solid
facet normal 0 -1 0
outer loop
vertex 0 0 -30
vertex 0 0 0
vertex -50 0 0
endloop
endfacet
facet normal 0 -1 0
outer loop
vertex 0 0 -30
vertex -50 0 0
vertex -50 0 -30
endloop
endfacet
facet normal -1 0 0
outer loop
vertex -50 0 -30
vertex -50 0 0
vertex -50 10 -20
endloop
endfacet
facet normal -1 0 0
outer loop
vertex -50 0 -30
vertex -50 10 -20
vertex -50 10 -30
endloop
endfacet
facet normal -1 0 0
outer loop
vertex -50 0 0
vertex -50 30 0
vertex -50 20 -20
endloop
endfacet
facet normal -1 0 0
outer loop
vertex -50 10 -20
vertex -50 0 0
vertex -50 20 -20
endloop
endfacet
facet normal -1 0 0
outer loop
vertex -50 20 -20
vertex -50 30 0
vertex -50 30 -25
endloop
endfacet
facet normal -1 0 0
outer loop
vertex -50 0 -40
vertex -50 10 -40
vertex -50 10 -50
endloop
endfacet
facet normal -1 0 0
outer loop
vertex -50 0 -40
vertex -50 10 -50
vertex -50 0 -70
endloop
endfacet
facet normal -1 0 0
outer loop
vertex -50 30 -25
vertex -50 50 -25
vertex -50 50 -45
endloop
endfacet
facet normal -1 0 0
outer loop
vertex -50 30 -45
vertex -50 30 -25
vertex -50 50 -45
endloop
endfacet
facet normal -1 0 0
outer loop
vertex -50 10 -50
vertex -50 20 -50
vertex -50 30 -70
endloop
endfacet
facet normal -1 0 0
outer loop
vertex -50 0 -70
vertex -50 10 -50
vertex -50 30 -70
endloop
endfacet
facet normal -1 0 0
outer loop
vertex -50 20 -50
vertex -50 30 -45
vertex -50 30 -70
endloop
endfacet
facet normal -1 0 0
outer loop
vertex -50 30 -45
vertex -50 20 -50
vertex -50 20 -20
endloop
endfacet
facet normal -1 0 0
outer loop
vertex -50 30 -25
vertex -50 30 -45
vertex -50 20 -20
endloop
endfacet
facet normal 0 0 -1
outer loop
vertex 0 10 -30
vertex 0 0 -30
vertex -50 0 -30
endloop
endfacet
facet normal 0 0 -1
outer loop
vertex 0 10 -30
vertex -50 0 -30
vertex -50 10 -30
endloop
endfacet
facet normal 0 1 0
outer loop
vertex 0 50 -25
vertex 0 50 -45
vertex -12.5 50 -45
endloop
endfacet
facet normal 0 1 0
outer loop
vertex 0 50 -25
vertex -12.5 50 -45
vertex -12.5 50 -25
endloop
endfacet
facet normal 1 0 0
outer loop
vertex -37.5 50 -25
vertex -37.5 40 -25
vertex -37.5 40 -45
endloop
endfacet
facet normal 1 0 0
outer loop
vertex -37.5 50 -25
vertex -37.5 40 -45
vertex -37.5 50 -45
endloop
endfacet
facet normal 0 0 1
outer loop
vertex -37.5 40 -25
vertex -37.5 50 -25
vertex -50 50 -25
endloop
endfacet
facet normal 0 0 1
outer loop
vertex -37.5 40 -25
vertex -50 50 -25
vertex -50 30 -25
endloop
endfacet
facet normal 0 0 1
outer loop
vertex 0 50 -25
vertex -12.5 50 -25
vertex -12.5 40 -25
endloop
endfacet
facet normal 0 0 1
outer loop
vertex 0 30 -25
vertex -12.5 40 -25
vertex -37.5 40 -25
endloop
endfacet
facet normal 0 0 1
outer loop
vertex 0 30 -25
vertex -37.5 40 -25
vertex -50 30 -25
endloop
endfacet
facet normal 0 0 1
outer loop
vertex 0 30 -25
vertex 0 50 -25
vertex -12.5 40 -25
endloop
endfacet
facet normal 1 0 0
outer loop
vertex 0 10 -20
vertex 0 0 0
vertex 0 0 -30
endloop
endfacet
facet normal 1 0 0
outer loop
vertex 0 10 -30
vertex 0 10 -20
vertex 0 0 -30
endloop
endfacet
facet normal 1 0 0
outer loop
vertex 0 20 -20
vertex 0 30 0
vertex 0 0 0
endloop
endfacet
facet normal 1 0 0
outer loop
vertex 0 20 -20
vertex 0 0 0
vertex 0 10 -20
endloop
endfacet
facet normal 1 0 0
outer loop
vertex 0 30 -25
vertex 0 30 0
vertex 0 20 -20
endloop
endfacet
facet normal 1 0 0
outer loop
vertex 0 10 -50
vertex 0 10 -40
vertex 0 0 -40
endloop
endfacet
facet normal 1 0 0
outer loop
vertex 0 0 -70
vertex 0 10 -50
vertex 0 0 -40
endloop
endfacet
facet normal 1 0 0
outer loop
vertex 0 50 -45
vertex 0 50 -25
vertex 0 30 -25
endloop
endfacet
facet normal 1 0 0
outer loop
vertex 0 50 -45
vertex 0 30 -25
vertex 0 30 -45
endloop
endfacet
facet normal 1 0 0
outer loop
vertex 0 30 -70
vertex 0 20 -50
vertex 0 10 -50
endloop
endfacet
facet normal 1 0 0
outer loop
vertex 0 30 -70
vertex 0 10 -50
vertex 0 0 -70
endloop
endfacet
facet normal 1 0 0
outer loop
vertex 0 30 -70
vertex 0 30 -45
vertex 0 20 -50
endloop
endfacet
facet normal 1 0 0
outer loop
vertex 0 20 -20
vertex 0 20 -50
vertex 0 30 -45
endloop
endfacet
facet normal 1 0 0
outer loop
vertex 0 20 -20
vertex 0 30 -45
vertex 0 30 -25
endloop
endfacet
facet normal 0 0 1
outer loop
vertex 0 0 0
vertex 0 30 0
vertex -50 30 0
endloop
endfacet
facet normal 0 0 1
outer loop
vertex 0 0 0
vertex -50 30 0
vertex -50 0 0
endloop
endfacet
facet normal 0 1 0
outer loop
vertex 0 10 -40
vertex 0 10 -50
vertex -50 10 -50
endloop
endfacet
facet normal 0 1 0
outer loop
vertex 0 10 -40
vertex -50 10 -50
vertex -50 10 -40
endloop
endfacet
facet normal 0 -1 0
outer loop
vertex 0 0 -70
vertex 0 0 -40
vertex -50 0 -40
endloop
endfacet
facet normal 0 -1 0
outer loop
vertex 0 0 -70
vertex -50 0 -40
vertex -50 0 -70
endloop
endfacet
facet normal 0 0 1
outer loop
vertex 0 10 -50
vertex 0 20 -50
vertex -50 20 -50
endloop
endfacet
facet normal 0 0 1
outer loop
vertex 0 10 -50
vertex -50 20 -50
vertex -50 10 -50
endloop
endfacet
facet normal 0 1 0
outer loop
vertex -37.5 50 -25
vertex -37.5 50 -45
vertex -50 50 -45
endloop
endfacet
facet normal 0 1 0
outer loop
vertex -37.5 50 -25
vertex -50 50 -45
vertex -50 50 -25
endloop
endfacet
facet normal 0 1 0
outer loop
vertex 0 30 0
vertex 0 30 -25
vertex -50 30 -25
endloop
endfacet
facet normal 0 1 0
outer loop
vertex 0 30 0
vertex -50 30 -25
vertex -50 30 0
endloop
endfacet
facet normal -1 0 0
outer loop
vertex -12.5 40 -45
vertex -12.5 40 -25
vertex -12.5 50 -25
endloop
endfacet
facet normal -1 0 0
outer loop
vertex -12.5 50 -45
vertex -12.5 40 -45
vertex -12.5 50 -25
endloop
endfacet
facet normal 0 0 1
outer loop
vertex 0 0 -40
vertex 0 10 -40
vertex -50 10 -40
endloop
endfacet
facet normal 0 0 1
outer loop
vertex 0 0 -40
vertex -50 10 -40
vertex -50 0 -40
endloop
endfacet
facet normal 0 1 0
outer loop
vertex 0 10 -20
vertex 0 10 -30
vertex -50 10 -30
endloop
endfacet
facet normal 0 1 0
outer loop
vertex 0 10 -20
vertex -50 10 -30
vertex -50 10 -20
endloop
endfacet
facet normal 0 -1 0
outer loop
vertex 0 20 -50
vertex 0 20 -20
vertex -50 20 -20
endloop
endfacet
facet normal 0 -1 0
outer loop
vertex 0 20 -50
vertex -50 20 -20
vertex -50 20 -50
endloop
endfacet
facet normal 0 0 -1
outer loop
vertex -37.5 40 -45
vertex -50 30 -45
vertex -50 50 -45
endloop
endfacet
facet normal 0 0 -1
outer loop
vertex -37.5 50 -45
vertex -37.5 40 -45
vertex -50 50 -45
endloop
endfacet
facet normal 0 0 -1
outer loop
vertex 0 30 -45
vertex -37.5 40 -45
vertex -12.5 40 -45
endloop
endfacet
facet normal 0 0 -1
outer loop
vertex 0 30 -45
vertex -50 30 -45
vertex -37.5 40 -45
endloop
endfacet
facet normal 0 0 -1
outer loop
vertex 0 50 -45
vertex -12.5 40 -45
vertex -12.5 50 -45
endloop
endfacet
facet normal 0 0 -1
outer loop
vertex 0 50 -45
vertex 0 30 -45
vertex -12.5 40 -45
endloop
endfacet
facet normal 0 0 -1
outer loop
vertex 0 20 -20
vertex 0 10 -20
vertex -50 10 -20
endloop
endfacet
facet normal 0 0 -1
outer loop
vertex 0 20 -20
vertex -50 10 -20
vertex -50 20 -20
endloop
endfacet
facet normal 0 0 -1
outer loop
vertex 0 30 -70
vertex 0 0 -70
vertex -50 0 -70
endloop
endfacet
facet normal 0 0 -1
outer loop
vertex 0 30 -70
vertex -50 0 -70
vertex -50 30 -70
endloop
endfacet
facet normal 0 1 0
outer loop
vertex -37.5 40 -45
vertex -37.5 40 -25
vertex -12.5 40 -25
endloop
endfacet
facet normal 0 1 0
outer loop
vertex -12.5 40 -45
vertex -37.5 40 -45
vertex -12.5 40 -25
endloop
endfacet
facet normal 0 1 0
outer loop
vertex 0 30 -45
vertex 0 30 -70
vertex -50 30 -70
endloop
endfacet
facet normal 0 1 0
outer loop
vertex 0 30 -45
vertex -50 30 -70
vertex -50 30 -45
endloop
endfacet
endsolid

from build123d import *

# Parameters (mm, degrees)
BOSS_EXTRUDE1_DEPTH = 50
SKETCH2_W           = 25
SKETCH2_H           = 10
CUT_EXTRUDE1_DEPTH  = 84.815273071


with BuildPart() as part:
    # Sketch1 → Boss-Extrude1 (new body)
    with BuildSketch(Plane(origin=(0, 0, 0), x_dir=(0, 0, -1), z_dir=(1, 0, 0))):
        Polygon((0, 0), (30, 0), (30, 10), (20, 10), (20, 20), (50, 20), (50, 10), (40, 10), (40, 0), (70, 0), (70, 30), (45, 30), (45, 50), (25, 50), (25, 30), (0, 30), align=None)
    extrude(amount=-BOSS_EXTRUDE1_DEPTH)

    # Sketch2 → Cut-Extrude1 (cut, through all)
    with BuildSketch(Plane.XY.offset(-25)):
        with Locations((-25, 45)):
            Rectangle(SKETCH2_W, SKETCH2_H)
    extrude(amount=-CUT_EXTRUDE1_DEPTH, mode=Mode.SUBTRACT)


solid = part.part
